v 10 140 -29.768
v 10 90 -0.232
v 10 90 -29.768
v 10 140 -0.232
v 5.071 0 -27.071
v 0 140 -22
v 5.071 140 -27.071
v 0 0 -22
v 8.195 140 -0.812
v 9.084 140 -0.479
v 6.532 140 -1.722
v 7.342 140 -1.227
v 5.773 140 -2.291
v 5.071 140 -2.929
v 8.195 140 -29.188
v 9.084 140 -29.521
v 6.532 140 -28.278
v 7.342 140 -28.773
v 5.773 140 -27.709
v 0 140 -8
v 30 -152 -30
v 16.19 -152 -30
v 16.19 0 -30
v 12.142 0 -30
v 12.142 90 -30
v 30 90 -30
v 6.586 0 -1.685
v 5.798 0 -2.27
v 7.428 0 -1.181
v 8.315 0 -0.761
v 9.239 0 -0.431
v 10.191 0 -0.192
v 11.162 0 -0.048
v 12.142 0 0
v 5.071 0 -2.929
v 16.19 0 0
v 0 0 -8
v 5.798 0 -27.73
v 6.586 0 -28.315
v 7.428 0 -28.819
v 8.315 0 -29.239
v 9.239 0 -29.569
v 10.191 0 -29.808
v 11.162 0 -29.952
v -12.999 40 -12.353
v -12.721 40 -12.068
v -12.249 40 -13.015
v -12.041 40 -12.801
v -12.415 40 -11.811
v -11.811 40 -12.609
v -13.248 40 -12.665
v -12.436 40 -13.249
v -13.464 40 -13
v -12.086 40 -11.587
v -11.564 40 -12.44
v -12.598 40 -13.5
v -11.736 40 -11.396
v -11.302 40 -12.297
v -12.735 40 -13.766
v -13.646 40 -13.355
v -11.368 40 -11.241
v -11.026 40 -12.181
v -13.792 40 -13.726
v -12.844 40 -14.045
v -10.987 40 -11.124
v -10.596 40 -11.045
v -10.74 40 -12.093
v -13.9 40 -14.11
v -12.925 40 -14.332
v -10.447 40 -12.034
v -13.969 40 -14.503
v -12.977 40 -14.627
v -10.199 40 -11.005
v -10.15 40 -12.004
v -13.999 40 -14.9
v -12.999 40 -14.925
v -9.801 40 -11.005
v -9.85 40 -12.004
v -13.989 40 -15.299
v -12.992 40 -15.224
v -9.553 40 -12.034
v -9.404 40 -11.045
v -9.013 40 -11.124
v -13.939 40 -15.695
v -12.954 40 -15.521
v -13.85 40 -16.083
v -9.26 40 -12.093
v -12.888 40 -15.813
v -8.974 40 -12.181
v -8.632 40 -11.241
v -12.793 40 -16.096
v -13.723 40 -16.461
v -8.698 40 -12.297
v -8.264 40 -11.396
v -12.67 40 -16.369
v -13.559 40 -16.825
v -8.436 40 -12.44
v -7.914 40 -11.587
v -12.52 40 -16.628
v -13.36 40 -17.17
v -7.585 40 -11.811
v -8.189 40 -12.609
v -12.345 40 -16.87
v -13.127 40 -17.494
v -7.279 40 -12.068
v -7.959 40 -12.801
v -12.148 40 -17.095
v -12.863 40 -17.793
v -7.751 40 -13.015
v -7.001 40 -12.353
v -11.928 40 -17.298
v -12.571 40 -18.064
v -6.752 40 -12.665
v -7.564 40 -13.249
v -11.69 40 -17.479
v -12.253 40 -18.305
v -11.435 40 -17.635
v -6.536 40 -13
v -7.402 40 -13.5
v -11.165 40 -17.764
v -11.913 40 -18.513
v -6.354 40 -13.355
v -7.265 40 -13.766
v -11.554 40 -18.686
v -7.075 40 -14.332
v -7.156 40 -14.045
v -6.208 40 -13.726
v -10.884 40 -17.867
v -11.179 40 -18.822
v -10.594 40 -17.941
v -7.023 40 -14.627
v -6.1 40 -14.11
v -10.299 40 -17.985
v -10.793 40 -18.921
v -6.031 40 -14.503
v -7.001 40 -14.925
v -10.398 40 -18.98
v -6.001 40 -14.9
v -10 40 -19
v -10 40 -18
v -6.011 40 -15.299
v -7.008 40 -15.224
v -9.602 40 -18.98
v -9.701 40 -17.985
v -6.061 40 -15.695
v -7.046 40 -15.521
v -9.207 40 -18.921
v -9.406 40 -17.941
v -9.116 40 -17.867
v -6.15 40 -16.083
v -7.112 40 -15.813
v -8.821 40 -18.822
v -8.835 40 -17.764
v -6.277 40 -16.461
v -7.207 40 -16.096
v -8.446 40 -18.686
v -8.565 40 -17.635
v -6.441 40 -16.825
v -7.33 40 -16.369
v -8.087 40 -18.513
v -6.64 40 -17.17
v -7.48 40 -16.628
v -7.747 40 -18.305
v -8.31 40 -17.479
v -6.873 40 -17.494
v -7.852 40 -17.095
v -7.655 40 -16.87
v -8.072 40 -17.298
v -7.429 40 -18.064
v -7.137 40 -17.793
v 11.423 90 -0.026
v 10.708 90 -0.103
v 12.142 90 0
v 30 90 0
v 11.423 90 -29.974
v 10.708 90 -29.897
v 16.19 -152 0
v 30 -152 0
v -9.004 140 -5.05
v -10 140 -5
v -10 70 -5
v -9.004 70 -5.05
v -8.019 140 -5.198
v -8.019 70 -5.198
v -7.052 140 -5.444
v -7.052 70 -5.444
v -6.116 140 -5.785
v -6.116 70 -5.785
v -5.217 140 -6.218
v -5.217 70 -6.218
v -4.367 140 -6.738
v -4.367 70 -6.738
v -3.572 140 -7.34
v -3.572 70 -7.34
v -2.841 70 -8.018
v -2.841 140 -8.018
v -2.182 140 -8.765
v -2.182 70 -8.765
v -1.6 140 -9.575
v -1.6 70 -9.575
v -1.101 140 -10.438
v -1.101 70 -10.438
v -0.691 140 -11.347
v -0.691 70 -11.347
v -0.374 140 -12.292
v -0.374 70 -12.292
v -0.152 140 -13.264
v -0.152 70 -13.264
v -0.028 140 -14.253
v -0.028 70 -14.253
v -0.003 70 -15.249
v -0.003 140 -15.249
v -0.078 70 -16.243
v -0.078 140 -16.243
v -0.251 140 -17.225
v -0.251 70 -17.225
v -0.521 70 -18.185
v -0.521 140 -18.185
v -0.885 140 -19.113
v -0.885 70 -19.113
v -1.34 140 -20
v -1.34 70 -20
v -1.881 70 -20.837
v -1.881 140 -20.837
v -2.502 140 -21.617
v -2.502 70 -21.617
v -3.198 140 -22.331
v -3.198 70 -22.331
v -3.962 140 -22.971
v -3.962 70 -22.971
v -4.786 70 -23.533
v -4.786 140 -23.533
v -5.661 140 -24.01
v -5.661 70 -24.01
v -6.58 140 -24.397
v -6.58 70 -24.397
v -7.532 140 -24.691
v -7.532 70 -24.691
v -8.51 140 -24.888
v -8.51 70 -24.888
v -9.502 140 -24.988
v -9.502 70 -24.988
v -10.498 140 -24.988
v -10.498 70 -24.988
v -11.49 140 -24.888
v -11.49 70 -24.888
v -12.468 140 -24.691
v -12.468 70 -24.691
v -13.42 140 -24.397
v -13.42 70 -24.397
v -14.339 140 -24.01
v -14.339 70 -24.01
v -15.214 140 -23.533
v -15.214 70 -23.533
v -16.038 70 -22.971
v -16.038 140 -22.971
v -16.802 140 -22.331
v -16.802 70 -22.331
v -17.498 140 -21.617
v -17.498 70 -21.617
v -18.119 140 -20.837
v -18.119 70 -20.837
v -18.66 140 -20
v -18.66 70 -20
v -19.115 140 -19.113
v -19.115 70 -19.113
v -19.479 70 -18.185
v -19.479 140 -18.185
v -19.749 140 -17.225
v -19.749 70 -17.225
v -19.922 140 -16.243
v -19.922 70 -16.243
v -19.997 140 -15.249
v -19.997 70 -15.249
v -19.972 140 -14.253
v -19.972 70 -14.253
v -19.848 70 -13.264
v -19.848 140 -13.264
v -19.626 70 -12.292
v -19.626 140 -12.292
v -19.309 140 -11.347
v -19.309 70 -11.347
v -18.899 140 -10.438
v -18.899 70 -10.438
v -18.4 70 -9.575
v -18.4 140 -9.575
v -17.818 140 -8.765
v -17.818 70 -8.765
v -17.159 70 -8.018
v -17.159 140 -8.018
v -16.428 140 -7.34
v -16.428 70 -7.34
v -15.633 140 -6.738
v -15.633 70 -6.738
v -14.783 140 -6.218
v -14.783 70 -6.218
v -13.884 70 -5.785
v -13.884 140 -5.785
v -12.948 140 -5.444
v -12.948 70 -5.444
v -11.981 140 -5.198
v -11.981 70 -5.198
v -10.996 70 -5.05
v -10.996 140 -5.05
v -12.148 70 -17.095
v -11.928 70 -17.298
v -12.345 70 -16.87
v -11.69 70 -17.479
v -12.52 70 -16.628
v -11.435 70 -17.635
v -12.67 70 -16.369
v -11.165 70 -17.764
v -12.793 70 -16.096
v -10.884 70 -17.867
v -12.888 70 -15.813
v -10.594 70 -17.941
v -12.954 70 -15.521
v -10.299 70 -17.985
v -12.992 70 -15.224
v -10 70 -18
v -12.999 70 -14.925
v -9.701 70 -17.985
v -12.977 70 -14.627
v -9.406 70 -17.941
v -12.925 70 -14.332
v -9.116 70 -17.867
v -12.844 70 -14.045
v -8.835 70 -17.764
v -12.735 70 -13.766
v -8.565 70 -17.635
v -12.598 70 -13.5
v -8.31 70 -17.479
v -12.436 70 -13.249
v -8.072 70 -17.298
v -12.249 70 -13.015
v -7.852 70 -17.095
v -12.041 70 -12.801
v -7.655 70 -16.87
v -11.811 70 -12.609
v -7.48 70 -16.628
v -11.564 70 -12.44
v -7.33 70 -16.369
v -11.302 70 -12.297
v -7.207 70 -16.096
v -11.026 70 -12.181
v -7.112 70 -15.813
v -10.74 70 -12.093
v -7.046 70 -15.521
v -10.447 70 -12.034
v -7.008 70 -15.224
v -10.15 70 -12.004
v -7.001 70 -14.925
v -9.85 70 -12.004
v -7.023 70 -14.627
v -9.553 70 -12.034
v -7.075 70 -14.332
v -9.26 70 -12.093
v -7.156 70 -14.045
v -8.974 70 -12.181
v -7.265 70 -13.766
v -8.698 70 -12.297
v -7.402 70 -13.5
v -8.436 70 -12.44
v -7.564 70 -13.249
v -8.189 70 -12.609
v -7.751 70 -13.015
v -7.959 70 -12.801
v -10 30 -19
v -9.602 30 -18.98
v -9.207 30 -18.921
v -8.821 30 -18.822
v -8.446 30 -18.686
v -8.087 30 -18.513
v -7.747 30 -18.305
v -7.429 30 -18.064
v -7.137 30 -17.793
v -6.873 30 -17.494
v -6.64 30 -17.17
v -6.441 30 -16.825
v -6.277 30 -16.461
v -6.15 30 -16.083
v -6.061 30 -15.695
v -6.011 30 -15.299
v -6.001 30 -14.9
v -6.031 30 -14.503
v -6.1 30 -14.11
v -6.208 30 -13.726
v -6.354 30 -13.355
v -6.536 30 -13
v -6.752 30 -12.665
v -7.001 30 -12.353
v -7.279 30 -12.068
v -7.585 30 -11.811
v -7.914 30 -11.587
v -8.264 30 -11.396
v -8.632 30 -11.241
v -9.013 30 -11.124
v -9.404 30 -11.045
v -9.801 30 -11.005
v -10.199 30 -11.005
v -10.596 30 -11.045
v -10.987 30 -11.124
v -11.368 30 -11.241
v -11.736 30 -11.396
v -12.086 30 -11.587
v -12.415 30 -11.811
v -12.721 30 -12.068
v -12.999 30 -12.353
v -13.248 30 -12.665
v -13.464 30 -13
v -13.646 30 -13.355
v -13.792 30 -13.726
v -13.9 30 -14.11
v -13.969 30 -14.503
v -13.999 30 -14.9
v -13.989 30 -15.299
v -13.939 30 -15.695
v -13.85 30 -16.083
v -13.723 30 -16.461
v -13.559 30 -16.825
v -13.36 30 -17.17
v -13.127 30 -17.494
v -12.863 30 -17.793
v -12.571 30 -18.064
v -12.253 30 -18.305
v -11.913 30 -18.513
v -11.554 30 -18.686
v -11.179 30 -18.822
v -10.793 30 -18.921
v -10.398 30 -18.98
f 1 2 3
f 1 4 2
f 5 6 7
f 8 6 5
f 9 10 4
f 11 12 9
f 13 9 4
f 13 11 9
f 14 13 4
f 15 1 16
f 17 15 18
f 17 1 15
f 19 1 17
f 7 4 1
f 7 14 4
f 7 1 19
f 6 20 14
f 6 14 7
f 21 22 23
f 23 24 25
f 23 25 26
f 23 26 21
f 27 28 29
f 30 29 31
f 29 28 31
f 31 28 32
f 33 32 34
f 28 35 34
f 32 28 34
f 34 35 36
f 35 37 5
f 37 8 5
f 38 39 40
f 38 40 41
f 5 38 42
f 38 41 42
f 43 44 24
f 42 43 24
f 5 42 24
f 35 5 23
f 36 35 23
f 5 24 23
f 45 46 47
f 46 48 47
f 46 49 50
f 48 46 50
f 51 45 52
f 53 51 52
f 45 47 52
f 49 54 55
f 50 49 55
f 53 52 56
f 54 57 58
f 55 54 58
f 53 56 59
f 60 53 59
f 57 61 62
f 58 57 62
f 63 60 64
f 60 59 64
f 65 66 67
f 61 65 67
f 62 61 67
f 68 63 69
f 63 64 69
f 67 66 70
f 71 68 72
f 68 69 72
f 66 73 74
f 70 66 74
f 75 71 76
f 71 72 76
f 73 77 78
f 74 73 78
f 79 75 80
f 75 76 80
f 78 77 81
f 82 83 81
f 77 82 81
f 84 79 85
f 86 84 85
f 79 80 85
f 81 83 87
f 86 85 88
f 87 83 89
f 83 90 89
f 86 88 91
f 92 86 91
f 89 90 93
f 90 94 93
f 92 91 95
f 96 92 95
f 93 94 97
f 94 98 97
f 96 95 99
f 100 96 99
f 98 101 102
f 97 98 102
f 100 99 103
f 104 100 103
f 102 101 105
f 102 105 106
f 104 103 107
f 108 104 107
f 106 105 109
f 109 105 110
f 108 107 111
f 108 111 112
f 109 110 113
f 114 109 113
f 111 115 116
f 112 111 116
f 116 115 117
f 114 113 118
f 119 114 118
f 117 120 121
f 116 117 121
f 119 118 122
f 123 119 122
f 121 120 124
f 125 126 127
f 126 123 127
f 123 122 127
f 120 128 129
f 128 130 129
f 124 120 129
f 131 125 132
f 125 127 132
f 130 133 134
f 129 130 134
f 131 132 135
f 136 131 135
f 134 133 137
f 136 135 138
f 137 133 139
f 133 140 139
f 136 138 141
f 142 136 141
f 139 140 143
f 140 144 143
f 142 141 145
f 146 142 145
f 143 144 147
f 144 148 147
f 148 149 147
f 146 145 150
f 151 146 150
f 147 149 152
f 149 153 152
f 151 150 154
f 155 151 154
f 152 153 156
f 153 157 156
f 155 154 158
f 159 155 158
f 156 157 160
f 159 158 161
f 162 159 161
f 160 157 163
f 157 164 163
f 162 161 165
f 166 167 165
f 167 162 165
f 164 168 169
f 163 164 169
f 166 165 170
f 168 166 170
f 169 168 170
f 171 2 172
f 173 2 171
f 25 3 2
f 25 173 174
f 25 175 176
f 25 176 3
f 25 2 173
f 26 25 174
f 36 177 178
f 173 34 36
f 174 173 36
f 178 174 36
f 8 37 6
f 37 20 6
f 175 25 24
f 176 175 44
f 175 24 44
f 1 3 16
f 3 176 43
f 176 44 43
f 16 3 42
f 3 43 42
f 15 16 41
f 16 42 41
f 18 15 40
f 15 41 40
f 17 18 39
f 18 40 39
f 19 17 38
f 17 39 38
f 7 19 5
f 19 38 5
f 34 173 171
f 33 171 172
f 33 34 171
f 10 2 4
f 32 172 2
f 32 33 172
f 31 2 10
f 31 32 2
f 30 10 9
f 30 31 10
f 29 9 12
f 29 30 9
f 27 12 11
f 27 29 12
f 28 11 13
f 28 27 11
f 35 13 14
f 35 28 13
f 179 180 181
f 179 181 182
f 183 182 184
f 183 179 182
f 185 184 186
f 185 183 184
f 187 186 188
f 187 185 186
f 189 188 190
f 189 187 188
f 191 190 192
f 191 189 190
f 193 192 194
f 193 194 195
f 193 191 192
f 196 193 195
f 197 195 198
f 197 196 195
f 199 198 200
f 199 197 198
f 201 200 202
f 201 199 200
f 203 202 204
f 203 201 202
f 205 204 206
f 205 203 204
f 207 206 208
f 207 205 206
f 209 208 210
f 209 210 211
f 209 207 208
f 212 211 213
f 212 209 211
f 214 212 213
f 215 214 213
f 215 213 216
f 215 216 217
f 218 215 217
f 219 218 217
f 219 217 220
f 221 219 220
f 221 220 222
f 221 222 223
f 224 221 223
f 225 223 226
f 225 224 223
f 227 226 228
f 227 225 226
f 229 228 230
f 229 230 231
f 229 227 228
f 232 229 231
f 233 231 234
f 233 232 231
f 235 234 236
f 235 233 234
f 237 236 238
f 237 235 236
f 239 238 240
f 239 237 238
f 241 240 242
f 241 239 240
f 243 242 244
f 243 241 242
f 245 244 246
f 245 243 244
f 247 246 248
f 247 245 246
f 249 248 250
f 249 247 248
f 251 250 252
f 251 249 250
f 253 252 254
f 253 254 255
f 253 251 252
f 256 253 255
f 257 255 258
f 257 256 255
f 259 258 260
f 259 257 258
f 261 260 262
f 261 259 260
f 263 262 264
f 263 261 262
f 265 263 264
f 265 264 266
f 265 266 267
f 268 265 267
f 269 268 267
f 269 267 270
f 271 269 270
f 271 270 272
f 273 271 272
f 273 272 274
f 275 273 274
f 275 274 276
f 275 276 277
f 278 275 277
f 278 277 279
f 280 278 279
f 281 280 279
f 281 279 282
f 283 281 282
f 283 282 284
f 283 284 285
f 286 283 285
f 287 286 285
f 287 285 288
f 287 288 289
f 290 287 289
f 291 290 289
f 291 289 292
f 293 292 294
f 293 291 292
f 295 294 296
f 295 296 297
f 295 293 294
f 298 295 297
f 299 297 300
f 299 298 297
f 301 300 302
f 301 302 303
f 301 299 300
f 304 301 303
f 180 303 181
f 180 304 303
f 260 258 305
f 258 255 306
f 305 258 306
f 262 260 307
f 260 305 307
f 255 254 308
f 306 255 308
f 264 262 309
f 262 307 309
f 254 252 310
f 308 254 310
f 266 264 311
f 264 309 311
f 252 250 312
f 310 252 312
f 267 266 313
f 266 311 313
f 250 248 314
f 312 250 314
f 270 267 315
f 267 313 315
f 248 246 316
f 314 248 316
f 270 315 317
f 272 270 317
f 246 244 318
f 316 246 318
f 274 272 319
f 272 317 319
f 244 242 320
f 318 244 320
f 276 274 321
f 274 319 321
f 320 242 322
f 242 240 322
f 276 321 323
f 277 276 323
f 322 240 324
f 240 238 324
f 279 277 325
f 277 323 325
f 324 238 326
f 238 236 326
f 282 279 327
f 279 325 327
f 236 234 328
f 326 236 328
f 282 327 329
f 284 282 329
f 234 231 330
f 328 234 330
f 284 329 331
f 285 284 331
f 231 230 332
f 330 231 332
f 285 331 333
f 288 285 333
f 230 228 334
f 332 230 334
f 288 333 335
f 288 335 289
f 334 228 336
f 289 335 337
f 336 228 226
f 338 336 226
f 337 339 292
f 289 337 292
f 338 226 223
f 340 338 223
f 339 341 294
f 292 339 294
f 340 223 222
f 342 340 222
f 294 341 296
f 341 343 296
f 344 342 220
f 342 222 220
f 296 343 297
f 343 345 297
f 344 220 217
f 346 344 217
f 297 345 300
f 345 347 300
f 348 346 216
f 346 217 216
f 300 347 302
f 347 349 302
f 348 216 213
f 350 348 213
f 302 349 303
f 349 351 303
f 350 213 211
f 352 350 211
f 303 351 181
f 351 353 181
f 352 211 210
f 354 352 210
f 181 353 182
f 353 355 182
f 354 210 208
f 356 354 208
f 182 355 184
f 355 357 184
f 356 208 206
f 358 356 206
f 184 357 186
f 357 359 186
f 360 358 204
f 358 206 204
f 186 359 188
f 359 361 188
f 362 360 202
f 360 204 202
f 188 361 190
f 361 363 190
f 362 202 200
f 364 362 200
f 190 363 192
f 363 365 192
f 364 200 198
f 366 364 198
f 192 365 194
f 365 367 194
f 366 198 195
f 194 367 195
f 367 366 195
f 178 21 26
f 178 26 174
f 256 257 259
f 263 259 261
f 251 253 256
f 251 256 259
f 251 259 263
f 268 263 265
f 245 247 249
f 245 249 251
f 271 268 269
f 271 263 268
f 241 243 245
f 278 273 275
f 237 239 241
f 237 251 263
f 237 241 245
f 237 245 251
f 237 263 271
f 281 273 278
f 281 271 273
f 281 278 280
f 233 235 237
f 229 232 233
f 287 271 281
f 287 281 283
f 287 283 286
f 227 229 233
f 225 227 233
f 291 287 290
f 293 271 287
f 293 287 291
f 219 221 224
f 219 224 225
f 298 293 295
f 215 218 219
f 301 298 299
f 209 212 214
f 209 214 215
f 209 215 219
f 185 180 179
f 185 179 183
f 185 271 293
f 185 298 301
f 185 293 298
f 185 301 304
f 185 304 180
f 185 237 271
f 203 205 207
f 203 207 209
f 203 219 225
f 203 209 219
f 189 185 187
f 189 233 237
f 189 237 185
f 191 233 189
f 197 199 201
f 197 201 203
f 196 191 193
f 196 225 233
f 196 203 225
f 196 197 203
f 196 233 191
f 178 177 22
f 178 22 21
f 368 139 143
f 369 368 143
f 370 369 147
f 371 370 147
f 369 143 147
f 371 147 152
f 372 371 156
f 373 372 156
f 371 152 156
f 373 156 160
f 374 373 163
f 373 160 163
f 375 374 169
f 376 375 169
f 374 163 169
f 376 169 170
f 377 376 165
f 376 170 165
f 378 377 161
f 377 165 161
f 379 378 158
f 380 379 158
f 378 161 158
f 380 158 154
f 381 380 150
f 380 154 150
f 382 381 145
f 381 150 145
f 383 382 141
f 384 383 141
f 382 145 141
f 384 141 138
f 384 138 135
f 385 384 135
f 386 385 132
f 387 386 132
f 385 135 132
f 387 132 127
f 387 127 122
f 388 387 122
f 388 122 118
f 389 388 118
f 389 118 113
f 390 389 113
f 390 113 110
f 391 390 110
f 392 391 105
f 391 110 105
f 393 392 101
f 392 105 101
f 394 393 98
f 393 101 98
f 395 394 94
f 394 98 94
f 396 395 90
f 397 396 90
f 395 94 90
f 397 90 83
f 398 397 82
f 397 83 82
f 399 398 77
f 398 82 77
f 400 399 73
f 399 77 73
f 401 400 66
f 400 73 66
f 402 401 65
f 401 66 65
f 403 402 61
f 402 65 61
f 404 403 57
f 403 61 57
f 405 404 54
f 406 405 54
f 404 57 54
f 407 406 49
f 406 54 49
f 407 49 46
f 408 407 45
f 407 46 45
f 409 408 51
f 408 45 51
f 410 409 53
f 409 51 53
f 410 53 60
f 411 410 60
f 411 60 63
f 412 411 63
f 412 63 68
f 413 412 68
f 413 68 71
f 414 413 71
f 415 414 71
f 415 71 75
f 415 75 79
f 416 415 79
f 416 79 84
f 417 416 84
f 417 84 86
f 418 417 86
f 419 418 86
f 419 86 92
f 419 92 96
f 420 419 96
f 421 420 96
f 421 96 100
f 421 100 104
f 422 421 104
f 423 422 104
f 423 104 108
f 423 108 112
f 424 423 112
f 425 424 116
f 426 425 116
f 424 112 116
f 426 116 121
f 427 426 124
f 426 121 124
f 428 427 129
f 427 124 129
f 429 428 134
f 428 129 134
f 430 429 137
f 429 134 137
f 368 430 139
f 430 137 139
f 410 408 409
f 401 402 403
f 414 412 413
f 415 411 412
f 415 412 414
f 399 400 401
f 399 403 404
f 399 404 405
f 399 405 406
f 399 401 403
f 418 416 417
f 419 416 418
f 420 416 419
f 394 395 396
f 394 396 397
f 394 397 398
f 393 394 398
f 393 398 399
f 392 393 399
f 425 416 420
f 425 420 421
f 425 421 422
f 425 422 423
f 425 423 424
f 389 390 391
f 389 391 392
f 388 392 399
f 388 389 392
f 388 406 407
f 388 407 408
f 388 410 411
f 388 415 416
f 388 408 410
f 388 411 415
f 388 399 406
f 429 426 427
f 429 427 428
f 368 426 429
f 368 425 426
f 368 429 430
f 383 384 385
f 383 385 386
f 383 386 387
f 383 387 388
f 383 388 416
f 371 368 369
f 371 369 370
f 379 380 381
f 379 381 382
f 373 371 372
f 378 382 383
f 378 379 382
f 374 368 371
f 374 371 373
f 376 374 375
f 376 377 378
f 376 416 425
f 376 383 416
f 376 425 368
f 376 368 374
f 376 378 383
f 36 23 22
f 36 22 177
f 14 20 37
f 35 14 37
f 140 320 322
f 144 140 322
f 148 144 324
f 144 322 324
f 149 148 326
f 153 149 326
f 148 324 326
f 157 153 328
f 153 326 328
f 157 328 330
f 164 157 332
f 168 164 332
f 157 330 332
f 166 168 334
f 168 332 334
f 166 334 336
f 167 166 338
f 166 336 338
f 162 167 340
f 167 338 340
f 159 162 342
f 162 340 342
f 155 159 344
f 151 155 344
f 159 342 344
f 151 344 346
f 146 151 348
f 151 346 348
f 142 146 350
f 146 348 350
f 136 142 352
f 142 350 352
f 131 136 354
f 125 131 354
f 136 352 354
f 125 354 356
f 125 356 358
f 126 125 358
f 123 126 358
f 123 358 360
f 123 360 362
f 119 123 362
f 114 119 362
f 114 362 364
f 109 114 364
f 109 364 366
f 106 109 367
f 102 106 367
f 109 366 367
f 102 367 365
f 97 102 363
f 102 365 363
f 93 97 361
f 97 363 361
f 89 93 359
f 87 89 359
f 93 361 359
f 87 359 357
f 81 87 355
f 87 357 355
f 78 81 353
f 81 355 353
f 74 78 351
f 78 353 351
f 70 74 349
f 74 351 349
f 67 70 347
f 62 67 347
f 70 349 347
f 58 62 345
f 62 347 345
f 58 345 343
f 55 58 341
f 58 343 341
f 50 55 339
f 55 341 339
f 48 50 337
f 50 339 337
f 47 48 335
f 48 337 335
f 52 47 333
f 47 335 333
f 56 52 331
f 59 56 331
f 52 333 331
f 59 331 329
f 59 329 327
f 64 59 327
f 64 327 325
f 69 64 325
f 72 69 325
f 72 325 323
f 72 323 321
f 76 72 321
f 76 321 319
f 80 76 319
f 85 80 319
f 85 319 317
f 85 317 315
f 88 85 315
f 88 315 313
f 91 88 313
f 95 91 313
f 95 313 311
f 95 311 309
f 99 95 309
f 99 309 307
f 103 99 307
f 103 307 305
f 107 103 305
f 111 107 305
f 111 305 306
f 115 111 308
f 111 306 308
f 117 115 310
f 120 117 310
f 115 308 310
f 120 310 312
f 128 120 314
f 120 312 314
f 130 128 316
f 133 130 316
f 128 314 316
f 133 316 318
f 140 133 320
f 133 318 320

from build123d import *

# Parameters (mm, degrees)
SKETCH1_W           = 30
SKETCH1_H           = 30
BOSS_EXTRUDE1_DEPTH = 90
SKETCH2_W           = 30
SKETCH2_H           = 50
BOSS_EXTRUDE2_DEPTH = 10
SKETCH3_R           = 10
BOSS_EXTRUDE3_DEPTH = 70
SKETCH4_R           = 3
BOSS_EXTRUDE4_DEPTH = 30
SKETCH5_R           = 4
BOSS_EXTRUDE5_DEPTH = 10
CHAMFER1_SIZE       = 8
FILLET1_R           = 10
SKETCH6_W           = 13.80987909
SKETCH6_H           = 30
BOSS_EXTRUDE6_DEPTH = 152


with BuildPart() as part:
    # Sketch1 → Boss-Extrude1 (new body)
    with BuildSketch(Plane(origin=(0, 0, 0), x_dir=(1, 0, 0), z_dir=(0, 1, 0))):
        with Locations((15, 15)):
            Rectangle(SKETCH1_W, SKETCH1_H)
    extrude(amount=BOSS_EXTRUDE1_DEPTH)

    # Sketch2 → Boss-Extrude2 (add)
    with BuildSketch(Plane(origin=(0, 0, 0), x_dir=(0, 0, -1), z_dir=(1, 0, 0))):
        with Locations((15, 115)):
            Rectangle(SKETCH2_W, SKETCH2_H)
    extrude(amount=BOSS_EXTRUDE2_DEPTH)

    # Chamfer1
    chamfer1_edges = [part.edges().sort_by_distance(p)[0] for p in [
        (0, 70, -30),
        (0, 70, 0),
    ]]
    chamfer(chamfer1_edges, length=CHAMFER1_SIZE)

    # Fillet1
    fillet1_edges = [part.edges().sort_by_distance(p)[0] for p in [
        (8, 70, -30),
        (8, 70, 0),
    ]]
    fillet(fillet1_edges, radius=FILLET1_R)

    # Sketch6 → Boss-Extrude6 (add)
    with BuildSketch(Plane.XZ):
        with Locations((23.095060455, -15)):
            Rectangle(SKETCH6_W, SKETCH6_H)
    extrude(amount=BOSS_EXTRUDE6_DEPTH)


with BuildPart() as body_2:
    # Sketch3 → Boss-Extrude3 (new body)
    with BuildSketch(Plane(origin=(0, 140, 0), x_dir=(1, 0, 0), z_dir=(0, 1, 0))):
        with Locations(Location((-10, 15, 0), (0, 0, 270))):
            Circle(SKETCH3_R)
    extrude(amount=-BOSS_EXTRUDE3_DEPTH)

    # Sketch4 → Boss-Extrude4 (add)
    with BuildSketch(Plane.XZ.offset(-70)):
        with Locations(Location((-10, -15, 0), (0, 0, 270))):
            Circle(SKETCH4_R)
    extrude(amount=BOSS_EXTRUDE4_DEPTH)

    # Sketch5 → Boss-Extrude5 (add)
    with BuildSketch(Plane.XZ.offset(-40)):
        with Locations(Location((-10, -15, 0), (0, 0, 270))):
            Circle(SKETCH5_R)
    extrude(amount=BOSS_EXTRUDE5_DEPTH)


solid = Compound([part.part, body_2.part])
